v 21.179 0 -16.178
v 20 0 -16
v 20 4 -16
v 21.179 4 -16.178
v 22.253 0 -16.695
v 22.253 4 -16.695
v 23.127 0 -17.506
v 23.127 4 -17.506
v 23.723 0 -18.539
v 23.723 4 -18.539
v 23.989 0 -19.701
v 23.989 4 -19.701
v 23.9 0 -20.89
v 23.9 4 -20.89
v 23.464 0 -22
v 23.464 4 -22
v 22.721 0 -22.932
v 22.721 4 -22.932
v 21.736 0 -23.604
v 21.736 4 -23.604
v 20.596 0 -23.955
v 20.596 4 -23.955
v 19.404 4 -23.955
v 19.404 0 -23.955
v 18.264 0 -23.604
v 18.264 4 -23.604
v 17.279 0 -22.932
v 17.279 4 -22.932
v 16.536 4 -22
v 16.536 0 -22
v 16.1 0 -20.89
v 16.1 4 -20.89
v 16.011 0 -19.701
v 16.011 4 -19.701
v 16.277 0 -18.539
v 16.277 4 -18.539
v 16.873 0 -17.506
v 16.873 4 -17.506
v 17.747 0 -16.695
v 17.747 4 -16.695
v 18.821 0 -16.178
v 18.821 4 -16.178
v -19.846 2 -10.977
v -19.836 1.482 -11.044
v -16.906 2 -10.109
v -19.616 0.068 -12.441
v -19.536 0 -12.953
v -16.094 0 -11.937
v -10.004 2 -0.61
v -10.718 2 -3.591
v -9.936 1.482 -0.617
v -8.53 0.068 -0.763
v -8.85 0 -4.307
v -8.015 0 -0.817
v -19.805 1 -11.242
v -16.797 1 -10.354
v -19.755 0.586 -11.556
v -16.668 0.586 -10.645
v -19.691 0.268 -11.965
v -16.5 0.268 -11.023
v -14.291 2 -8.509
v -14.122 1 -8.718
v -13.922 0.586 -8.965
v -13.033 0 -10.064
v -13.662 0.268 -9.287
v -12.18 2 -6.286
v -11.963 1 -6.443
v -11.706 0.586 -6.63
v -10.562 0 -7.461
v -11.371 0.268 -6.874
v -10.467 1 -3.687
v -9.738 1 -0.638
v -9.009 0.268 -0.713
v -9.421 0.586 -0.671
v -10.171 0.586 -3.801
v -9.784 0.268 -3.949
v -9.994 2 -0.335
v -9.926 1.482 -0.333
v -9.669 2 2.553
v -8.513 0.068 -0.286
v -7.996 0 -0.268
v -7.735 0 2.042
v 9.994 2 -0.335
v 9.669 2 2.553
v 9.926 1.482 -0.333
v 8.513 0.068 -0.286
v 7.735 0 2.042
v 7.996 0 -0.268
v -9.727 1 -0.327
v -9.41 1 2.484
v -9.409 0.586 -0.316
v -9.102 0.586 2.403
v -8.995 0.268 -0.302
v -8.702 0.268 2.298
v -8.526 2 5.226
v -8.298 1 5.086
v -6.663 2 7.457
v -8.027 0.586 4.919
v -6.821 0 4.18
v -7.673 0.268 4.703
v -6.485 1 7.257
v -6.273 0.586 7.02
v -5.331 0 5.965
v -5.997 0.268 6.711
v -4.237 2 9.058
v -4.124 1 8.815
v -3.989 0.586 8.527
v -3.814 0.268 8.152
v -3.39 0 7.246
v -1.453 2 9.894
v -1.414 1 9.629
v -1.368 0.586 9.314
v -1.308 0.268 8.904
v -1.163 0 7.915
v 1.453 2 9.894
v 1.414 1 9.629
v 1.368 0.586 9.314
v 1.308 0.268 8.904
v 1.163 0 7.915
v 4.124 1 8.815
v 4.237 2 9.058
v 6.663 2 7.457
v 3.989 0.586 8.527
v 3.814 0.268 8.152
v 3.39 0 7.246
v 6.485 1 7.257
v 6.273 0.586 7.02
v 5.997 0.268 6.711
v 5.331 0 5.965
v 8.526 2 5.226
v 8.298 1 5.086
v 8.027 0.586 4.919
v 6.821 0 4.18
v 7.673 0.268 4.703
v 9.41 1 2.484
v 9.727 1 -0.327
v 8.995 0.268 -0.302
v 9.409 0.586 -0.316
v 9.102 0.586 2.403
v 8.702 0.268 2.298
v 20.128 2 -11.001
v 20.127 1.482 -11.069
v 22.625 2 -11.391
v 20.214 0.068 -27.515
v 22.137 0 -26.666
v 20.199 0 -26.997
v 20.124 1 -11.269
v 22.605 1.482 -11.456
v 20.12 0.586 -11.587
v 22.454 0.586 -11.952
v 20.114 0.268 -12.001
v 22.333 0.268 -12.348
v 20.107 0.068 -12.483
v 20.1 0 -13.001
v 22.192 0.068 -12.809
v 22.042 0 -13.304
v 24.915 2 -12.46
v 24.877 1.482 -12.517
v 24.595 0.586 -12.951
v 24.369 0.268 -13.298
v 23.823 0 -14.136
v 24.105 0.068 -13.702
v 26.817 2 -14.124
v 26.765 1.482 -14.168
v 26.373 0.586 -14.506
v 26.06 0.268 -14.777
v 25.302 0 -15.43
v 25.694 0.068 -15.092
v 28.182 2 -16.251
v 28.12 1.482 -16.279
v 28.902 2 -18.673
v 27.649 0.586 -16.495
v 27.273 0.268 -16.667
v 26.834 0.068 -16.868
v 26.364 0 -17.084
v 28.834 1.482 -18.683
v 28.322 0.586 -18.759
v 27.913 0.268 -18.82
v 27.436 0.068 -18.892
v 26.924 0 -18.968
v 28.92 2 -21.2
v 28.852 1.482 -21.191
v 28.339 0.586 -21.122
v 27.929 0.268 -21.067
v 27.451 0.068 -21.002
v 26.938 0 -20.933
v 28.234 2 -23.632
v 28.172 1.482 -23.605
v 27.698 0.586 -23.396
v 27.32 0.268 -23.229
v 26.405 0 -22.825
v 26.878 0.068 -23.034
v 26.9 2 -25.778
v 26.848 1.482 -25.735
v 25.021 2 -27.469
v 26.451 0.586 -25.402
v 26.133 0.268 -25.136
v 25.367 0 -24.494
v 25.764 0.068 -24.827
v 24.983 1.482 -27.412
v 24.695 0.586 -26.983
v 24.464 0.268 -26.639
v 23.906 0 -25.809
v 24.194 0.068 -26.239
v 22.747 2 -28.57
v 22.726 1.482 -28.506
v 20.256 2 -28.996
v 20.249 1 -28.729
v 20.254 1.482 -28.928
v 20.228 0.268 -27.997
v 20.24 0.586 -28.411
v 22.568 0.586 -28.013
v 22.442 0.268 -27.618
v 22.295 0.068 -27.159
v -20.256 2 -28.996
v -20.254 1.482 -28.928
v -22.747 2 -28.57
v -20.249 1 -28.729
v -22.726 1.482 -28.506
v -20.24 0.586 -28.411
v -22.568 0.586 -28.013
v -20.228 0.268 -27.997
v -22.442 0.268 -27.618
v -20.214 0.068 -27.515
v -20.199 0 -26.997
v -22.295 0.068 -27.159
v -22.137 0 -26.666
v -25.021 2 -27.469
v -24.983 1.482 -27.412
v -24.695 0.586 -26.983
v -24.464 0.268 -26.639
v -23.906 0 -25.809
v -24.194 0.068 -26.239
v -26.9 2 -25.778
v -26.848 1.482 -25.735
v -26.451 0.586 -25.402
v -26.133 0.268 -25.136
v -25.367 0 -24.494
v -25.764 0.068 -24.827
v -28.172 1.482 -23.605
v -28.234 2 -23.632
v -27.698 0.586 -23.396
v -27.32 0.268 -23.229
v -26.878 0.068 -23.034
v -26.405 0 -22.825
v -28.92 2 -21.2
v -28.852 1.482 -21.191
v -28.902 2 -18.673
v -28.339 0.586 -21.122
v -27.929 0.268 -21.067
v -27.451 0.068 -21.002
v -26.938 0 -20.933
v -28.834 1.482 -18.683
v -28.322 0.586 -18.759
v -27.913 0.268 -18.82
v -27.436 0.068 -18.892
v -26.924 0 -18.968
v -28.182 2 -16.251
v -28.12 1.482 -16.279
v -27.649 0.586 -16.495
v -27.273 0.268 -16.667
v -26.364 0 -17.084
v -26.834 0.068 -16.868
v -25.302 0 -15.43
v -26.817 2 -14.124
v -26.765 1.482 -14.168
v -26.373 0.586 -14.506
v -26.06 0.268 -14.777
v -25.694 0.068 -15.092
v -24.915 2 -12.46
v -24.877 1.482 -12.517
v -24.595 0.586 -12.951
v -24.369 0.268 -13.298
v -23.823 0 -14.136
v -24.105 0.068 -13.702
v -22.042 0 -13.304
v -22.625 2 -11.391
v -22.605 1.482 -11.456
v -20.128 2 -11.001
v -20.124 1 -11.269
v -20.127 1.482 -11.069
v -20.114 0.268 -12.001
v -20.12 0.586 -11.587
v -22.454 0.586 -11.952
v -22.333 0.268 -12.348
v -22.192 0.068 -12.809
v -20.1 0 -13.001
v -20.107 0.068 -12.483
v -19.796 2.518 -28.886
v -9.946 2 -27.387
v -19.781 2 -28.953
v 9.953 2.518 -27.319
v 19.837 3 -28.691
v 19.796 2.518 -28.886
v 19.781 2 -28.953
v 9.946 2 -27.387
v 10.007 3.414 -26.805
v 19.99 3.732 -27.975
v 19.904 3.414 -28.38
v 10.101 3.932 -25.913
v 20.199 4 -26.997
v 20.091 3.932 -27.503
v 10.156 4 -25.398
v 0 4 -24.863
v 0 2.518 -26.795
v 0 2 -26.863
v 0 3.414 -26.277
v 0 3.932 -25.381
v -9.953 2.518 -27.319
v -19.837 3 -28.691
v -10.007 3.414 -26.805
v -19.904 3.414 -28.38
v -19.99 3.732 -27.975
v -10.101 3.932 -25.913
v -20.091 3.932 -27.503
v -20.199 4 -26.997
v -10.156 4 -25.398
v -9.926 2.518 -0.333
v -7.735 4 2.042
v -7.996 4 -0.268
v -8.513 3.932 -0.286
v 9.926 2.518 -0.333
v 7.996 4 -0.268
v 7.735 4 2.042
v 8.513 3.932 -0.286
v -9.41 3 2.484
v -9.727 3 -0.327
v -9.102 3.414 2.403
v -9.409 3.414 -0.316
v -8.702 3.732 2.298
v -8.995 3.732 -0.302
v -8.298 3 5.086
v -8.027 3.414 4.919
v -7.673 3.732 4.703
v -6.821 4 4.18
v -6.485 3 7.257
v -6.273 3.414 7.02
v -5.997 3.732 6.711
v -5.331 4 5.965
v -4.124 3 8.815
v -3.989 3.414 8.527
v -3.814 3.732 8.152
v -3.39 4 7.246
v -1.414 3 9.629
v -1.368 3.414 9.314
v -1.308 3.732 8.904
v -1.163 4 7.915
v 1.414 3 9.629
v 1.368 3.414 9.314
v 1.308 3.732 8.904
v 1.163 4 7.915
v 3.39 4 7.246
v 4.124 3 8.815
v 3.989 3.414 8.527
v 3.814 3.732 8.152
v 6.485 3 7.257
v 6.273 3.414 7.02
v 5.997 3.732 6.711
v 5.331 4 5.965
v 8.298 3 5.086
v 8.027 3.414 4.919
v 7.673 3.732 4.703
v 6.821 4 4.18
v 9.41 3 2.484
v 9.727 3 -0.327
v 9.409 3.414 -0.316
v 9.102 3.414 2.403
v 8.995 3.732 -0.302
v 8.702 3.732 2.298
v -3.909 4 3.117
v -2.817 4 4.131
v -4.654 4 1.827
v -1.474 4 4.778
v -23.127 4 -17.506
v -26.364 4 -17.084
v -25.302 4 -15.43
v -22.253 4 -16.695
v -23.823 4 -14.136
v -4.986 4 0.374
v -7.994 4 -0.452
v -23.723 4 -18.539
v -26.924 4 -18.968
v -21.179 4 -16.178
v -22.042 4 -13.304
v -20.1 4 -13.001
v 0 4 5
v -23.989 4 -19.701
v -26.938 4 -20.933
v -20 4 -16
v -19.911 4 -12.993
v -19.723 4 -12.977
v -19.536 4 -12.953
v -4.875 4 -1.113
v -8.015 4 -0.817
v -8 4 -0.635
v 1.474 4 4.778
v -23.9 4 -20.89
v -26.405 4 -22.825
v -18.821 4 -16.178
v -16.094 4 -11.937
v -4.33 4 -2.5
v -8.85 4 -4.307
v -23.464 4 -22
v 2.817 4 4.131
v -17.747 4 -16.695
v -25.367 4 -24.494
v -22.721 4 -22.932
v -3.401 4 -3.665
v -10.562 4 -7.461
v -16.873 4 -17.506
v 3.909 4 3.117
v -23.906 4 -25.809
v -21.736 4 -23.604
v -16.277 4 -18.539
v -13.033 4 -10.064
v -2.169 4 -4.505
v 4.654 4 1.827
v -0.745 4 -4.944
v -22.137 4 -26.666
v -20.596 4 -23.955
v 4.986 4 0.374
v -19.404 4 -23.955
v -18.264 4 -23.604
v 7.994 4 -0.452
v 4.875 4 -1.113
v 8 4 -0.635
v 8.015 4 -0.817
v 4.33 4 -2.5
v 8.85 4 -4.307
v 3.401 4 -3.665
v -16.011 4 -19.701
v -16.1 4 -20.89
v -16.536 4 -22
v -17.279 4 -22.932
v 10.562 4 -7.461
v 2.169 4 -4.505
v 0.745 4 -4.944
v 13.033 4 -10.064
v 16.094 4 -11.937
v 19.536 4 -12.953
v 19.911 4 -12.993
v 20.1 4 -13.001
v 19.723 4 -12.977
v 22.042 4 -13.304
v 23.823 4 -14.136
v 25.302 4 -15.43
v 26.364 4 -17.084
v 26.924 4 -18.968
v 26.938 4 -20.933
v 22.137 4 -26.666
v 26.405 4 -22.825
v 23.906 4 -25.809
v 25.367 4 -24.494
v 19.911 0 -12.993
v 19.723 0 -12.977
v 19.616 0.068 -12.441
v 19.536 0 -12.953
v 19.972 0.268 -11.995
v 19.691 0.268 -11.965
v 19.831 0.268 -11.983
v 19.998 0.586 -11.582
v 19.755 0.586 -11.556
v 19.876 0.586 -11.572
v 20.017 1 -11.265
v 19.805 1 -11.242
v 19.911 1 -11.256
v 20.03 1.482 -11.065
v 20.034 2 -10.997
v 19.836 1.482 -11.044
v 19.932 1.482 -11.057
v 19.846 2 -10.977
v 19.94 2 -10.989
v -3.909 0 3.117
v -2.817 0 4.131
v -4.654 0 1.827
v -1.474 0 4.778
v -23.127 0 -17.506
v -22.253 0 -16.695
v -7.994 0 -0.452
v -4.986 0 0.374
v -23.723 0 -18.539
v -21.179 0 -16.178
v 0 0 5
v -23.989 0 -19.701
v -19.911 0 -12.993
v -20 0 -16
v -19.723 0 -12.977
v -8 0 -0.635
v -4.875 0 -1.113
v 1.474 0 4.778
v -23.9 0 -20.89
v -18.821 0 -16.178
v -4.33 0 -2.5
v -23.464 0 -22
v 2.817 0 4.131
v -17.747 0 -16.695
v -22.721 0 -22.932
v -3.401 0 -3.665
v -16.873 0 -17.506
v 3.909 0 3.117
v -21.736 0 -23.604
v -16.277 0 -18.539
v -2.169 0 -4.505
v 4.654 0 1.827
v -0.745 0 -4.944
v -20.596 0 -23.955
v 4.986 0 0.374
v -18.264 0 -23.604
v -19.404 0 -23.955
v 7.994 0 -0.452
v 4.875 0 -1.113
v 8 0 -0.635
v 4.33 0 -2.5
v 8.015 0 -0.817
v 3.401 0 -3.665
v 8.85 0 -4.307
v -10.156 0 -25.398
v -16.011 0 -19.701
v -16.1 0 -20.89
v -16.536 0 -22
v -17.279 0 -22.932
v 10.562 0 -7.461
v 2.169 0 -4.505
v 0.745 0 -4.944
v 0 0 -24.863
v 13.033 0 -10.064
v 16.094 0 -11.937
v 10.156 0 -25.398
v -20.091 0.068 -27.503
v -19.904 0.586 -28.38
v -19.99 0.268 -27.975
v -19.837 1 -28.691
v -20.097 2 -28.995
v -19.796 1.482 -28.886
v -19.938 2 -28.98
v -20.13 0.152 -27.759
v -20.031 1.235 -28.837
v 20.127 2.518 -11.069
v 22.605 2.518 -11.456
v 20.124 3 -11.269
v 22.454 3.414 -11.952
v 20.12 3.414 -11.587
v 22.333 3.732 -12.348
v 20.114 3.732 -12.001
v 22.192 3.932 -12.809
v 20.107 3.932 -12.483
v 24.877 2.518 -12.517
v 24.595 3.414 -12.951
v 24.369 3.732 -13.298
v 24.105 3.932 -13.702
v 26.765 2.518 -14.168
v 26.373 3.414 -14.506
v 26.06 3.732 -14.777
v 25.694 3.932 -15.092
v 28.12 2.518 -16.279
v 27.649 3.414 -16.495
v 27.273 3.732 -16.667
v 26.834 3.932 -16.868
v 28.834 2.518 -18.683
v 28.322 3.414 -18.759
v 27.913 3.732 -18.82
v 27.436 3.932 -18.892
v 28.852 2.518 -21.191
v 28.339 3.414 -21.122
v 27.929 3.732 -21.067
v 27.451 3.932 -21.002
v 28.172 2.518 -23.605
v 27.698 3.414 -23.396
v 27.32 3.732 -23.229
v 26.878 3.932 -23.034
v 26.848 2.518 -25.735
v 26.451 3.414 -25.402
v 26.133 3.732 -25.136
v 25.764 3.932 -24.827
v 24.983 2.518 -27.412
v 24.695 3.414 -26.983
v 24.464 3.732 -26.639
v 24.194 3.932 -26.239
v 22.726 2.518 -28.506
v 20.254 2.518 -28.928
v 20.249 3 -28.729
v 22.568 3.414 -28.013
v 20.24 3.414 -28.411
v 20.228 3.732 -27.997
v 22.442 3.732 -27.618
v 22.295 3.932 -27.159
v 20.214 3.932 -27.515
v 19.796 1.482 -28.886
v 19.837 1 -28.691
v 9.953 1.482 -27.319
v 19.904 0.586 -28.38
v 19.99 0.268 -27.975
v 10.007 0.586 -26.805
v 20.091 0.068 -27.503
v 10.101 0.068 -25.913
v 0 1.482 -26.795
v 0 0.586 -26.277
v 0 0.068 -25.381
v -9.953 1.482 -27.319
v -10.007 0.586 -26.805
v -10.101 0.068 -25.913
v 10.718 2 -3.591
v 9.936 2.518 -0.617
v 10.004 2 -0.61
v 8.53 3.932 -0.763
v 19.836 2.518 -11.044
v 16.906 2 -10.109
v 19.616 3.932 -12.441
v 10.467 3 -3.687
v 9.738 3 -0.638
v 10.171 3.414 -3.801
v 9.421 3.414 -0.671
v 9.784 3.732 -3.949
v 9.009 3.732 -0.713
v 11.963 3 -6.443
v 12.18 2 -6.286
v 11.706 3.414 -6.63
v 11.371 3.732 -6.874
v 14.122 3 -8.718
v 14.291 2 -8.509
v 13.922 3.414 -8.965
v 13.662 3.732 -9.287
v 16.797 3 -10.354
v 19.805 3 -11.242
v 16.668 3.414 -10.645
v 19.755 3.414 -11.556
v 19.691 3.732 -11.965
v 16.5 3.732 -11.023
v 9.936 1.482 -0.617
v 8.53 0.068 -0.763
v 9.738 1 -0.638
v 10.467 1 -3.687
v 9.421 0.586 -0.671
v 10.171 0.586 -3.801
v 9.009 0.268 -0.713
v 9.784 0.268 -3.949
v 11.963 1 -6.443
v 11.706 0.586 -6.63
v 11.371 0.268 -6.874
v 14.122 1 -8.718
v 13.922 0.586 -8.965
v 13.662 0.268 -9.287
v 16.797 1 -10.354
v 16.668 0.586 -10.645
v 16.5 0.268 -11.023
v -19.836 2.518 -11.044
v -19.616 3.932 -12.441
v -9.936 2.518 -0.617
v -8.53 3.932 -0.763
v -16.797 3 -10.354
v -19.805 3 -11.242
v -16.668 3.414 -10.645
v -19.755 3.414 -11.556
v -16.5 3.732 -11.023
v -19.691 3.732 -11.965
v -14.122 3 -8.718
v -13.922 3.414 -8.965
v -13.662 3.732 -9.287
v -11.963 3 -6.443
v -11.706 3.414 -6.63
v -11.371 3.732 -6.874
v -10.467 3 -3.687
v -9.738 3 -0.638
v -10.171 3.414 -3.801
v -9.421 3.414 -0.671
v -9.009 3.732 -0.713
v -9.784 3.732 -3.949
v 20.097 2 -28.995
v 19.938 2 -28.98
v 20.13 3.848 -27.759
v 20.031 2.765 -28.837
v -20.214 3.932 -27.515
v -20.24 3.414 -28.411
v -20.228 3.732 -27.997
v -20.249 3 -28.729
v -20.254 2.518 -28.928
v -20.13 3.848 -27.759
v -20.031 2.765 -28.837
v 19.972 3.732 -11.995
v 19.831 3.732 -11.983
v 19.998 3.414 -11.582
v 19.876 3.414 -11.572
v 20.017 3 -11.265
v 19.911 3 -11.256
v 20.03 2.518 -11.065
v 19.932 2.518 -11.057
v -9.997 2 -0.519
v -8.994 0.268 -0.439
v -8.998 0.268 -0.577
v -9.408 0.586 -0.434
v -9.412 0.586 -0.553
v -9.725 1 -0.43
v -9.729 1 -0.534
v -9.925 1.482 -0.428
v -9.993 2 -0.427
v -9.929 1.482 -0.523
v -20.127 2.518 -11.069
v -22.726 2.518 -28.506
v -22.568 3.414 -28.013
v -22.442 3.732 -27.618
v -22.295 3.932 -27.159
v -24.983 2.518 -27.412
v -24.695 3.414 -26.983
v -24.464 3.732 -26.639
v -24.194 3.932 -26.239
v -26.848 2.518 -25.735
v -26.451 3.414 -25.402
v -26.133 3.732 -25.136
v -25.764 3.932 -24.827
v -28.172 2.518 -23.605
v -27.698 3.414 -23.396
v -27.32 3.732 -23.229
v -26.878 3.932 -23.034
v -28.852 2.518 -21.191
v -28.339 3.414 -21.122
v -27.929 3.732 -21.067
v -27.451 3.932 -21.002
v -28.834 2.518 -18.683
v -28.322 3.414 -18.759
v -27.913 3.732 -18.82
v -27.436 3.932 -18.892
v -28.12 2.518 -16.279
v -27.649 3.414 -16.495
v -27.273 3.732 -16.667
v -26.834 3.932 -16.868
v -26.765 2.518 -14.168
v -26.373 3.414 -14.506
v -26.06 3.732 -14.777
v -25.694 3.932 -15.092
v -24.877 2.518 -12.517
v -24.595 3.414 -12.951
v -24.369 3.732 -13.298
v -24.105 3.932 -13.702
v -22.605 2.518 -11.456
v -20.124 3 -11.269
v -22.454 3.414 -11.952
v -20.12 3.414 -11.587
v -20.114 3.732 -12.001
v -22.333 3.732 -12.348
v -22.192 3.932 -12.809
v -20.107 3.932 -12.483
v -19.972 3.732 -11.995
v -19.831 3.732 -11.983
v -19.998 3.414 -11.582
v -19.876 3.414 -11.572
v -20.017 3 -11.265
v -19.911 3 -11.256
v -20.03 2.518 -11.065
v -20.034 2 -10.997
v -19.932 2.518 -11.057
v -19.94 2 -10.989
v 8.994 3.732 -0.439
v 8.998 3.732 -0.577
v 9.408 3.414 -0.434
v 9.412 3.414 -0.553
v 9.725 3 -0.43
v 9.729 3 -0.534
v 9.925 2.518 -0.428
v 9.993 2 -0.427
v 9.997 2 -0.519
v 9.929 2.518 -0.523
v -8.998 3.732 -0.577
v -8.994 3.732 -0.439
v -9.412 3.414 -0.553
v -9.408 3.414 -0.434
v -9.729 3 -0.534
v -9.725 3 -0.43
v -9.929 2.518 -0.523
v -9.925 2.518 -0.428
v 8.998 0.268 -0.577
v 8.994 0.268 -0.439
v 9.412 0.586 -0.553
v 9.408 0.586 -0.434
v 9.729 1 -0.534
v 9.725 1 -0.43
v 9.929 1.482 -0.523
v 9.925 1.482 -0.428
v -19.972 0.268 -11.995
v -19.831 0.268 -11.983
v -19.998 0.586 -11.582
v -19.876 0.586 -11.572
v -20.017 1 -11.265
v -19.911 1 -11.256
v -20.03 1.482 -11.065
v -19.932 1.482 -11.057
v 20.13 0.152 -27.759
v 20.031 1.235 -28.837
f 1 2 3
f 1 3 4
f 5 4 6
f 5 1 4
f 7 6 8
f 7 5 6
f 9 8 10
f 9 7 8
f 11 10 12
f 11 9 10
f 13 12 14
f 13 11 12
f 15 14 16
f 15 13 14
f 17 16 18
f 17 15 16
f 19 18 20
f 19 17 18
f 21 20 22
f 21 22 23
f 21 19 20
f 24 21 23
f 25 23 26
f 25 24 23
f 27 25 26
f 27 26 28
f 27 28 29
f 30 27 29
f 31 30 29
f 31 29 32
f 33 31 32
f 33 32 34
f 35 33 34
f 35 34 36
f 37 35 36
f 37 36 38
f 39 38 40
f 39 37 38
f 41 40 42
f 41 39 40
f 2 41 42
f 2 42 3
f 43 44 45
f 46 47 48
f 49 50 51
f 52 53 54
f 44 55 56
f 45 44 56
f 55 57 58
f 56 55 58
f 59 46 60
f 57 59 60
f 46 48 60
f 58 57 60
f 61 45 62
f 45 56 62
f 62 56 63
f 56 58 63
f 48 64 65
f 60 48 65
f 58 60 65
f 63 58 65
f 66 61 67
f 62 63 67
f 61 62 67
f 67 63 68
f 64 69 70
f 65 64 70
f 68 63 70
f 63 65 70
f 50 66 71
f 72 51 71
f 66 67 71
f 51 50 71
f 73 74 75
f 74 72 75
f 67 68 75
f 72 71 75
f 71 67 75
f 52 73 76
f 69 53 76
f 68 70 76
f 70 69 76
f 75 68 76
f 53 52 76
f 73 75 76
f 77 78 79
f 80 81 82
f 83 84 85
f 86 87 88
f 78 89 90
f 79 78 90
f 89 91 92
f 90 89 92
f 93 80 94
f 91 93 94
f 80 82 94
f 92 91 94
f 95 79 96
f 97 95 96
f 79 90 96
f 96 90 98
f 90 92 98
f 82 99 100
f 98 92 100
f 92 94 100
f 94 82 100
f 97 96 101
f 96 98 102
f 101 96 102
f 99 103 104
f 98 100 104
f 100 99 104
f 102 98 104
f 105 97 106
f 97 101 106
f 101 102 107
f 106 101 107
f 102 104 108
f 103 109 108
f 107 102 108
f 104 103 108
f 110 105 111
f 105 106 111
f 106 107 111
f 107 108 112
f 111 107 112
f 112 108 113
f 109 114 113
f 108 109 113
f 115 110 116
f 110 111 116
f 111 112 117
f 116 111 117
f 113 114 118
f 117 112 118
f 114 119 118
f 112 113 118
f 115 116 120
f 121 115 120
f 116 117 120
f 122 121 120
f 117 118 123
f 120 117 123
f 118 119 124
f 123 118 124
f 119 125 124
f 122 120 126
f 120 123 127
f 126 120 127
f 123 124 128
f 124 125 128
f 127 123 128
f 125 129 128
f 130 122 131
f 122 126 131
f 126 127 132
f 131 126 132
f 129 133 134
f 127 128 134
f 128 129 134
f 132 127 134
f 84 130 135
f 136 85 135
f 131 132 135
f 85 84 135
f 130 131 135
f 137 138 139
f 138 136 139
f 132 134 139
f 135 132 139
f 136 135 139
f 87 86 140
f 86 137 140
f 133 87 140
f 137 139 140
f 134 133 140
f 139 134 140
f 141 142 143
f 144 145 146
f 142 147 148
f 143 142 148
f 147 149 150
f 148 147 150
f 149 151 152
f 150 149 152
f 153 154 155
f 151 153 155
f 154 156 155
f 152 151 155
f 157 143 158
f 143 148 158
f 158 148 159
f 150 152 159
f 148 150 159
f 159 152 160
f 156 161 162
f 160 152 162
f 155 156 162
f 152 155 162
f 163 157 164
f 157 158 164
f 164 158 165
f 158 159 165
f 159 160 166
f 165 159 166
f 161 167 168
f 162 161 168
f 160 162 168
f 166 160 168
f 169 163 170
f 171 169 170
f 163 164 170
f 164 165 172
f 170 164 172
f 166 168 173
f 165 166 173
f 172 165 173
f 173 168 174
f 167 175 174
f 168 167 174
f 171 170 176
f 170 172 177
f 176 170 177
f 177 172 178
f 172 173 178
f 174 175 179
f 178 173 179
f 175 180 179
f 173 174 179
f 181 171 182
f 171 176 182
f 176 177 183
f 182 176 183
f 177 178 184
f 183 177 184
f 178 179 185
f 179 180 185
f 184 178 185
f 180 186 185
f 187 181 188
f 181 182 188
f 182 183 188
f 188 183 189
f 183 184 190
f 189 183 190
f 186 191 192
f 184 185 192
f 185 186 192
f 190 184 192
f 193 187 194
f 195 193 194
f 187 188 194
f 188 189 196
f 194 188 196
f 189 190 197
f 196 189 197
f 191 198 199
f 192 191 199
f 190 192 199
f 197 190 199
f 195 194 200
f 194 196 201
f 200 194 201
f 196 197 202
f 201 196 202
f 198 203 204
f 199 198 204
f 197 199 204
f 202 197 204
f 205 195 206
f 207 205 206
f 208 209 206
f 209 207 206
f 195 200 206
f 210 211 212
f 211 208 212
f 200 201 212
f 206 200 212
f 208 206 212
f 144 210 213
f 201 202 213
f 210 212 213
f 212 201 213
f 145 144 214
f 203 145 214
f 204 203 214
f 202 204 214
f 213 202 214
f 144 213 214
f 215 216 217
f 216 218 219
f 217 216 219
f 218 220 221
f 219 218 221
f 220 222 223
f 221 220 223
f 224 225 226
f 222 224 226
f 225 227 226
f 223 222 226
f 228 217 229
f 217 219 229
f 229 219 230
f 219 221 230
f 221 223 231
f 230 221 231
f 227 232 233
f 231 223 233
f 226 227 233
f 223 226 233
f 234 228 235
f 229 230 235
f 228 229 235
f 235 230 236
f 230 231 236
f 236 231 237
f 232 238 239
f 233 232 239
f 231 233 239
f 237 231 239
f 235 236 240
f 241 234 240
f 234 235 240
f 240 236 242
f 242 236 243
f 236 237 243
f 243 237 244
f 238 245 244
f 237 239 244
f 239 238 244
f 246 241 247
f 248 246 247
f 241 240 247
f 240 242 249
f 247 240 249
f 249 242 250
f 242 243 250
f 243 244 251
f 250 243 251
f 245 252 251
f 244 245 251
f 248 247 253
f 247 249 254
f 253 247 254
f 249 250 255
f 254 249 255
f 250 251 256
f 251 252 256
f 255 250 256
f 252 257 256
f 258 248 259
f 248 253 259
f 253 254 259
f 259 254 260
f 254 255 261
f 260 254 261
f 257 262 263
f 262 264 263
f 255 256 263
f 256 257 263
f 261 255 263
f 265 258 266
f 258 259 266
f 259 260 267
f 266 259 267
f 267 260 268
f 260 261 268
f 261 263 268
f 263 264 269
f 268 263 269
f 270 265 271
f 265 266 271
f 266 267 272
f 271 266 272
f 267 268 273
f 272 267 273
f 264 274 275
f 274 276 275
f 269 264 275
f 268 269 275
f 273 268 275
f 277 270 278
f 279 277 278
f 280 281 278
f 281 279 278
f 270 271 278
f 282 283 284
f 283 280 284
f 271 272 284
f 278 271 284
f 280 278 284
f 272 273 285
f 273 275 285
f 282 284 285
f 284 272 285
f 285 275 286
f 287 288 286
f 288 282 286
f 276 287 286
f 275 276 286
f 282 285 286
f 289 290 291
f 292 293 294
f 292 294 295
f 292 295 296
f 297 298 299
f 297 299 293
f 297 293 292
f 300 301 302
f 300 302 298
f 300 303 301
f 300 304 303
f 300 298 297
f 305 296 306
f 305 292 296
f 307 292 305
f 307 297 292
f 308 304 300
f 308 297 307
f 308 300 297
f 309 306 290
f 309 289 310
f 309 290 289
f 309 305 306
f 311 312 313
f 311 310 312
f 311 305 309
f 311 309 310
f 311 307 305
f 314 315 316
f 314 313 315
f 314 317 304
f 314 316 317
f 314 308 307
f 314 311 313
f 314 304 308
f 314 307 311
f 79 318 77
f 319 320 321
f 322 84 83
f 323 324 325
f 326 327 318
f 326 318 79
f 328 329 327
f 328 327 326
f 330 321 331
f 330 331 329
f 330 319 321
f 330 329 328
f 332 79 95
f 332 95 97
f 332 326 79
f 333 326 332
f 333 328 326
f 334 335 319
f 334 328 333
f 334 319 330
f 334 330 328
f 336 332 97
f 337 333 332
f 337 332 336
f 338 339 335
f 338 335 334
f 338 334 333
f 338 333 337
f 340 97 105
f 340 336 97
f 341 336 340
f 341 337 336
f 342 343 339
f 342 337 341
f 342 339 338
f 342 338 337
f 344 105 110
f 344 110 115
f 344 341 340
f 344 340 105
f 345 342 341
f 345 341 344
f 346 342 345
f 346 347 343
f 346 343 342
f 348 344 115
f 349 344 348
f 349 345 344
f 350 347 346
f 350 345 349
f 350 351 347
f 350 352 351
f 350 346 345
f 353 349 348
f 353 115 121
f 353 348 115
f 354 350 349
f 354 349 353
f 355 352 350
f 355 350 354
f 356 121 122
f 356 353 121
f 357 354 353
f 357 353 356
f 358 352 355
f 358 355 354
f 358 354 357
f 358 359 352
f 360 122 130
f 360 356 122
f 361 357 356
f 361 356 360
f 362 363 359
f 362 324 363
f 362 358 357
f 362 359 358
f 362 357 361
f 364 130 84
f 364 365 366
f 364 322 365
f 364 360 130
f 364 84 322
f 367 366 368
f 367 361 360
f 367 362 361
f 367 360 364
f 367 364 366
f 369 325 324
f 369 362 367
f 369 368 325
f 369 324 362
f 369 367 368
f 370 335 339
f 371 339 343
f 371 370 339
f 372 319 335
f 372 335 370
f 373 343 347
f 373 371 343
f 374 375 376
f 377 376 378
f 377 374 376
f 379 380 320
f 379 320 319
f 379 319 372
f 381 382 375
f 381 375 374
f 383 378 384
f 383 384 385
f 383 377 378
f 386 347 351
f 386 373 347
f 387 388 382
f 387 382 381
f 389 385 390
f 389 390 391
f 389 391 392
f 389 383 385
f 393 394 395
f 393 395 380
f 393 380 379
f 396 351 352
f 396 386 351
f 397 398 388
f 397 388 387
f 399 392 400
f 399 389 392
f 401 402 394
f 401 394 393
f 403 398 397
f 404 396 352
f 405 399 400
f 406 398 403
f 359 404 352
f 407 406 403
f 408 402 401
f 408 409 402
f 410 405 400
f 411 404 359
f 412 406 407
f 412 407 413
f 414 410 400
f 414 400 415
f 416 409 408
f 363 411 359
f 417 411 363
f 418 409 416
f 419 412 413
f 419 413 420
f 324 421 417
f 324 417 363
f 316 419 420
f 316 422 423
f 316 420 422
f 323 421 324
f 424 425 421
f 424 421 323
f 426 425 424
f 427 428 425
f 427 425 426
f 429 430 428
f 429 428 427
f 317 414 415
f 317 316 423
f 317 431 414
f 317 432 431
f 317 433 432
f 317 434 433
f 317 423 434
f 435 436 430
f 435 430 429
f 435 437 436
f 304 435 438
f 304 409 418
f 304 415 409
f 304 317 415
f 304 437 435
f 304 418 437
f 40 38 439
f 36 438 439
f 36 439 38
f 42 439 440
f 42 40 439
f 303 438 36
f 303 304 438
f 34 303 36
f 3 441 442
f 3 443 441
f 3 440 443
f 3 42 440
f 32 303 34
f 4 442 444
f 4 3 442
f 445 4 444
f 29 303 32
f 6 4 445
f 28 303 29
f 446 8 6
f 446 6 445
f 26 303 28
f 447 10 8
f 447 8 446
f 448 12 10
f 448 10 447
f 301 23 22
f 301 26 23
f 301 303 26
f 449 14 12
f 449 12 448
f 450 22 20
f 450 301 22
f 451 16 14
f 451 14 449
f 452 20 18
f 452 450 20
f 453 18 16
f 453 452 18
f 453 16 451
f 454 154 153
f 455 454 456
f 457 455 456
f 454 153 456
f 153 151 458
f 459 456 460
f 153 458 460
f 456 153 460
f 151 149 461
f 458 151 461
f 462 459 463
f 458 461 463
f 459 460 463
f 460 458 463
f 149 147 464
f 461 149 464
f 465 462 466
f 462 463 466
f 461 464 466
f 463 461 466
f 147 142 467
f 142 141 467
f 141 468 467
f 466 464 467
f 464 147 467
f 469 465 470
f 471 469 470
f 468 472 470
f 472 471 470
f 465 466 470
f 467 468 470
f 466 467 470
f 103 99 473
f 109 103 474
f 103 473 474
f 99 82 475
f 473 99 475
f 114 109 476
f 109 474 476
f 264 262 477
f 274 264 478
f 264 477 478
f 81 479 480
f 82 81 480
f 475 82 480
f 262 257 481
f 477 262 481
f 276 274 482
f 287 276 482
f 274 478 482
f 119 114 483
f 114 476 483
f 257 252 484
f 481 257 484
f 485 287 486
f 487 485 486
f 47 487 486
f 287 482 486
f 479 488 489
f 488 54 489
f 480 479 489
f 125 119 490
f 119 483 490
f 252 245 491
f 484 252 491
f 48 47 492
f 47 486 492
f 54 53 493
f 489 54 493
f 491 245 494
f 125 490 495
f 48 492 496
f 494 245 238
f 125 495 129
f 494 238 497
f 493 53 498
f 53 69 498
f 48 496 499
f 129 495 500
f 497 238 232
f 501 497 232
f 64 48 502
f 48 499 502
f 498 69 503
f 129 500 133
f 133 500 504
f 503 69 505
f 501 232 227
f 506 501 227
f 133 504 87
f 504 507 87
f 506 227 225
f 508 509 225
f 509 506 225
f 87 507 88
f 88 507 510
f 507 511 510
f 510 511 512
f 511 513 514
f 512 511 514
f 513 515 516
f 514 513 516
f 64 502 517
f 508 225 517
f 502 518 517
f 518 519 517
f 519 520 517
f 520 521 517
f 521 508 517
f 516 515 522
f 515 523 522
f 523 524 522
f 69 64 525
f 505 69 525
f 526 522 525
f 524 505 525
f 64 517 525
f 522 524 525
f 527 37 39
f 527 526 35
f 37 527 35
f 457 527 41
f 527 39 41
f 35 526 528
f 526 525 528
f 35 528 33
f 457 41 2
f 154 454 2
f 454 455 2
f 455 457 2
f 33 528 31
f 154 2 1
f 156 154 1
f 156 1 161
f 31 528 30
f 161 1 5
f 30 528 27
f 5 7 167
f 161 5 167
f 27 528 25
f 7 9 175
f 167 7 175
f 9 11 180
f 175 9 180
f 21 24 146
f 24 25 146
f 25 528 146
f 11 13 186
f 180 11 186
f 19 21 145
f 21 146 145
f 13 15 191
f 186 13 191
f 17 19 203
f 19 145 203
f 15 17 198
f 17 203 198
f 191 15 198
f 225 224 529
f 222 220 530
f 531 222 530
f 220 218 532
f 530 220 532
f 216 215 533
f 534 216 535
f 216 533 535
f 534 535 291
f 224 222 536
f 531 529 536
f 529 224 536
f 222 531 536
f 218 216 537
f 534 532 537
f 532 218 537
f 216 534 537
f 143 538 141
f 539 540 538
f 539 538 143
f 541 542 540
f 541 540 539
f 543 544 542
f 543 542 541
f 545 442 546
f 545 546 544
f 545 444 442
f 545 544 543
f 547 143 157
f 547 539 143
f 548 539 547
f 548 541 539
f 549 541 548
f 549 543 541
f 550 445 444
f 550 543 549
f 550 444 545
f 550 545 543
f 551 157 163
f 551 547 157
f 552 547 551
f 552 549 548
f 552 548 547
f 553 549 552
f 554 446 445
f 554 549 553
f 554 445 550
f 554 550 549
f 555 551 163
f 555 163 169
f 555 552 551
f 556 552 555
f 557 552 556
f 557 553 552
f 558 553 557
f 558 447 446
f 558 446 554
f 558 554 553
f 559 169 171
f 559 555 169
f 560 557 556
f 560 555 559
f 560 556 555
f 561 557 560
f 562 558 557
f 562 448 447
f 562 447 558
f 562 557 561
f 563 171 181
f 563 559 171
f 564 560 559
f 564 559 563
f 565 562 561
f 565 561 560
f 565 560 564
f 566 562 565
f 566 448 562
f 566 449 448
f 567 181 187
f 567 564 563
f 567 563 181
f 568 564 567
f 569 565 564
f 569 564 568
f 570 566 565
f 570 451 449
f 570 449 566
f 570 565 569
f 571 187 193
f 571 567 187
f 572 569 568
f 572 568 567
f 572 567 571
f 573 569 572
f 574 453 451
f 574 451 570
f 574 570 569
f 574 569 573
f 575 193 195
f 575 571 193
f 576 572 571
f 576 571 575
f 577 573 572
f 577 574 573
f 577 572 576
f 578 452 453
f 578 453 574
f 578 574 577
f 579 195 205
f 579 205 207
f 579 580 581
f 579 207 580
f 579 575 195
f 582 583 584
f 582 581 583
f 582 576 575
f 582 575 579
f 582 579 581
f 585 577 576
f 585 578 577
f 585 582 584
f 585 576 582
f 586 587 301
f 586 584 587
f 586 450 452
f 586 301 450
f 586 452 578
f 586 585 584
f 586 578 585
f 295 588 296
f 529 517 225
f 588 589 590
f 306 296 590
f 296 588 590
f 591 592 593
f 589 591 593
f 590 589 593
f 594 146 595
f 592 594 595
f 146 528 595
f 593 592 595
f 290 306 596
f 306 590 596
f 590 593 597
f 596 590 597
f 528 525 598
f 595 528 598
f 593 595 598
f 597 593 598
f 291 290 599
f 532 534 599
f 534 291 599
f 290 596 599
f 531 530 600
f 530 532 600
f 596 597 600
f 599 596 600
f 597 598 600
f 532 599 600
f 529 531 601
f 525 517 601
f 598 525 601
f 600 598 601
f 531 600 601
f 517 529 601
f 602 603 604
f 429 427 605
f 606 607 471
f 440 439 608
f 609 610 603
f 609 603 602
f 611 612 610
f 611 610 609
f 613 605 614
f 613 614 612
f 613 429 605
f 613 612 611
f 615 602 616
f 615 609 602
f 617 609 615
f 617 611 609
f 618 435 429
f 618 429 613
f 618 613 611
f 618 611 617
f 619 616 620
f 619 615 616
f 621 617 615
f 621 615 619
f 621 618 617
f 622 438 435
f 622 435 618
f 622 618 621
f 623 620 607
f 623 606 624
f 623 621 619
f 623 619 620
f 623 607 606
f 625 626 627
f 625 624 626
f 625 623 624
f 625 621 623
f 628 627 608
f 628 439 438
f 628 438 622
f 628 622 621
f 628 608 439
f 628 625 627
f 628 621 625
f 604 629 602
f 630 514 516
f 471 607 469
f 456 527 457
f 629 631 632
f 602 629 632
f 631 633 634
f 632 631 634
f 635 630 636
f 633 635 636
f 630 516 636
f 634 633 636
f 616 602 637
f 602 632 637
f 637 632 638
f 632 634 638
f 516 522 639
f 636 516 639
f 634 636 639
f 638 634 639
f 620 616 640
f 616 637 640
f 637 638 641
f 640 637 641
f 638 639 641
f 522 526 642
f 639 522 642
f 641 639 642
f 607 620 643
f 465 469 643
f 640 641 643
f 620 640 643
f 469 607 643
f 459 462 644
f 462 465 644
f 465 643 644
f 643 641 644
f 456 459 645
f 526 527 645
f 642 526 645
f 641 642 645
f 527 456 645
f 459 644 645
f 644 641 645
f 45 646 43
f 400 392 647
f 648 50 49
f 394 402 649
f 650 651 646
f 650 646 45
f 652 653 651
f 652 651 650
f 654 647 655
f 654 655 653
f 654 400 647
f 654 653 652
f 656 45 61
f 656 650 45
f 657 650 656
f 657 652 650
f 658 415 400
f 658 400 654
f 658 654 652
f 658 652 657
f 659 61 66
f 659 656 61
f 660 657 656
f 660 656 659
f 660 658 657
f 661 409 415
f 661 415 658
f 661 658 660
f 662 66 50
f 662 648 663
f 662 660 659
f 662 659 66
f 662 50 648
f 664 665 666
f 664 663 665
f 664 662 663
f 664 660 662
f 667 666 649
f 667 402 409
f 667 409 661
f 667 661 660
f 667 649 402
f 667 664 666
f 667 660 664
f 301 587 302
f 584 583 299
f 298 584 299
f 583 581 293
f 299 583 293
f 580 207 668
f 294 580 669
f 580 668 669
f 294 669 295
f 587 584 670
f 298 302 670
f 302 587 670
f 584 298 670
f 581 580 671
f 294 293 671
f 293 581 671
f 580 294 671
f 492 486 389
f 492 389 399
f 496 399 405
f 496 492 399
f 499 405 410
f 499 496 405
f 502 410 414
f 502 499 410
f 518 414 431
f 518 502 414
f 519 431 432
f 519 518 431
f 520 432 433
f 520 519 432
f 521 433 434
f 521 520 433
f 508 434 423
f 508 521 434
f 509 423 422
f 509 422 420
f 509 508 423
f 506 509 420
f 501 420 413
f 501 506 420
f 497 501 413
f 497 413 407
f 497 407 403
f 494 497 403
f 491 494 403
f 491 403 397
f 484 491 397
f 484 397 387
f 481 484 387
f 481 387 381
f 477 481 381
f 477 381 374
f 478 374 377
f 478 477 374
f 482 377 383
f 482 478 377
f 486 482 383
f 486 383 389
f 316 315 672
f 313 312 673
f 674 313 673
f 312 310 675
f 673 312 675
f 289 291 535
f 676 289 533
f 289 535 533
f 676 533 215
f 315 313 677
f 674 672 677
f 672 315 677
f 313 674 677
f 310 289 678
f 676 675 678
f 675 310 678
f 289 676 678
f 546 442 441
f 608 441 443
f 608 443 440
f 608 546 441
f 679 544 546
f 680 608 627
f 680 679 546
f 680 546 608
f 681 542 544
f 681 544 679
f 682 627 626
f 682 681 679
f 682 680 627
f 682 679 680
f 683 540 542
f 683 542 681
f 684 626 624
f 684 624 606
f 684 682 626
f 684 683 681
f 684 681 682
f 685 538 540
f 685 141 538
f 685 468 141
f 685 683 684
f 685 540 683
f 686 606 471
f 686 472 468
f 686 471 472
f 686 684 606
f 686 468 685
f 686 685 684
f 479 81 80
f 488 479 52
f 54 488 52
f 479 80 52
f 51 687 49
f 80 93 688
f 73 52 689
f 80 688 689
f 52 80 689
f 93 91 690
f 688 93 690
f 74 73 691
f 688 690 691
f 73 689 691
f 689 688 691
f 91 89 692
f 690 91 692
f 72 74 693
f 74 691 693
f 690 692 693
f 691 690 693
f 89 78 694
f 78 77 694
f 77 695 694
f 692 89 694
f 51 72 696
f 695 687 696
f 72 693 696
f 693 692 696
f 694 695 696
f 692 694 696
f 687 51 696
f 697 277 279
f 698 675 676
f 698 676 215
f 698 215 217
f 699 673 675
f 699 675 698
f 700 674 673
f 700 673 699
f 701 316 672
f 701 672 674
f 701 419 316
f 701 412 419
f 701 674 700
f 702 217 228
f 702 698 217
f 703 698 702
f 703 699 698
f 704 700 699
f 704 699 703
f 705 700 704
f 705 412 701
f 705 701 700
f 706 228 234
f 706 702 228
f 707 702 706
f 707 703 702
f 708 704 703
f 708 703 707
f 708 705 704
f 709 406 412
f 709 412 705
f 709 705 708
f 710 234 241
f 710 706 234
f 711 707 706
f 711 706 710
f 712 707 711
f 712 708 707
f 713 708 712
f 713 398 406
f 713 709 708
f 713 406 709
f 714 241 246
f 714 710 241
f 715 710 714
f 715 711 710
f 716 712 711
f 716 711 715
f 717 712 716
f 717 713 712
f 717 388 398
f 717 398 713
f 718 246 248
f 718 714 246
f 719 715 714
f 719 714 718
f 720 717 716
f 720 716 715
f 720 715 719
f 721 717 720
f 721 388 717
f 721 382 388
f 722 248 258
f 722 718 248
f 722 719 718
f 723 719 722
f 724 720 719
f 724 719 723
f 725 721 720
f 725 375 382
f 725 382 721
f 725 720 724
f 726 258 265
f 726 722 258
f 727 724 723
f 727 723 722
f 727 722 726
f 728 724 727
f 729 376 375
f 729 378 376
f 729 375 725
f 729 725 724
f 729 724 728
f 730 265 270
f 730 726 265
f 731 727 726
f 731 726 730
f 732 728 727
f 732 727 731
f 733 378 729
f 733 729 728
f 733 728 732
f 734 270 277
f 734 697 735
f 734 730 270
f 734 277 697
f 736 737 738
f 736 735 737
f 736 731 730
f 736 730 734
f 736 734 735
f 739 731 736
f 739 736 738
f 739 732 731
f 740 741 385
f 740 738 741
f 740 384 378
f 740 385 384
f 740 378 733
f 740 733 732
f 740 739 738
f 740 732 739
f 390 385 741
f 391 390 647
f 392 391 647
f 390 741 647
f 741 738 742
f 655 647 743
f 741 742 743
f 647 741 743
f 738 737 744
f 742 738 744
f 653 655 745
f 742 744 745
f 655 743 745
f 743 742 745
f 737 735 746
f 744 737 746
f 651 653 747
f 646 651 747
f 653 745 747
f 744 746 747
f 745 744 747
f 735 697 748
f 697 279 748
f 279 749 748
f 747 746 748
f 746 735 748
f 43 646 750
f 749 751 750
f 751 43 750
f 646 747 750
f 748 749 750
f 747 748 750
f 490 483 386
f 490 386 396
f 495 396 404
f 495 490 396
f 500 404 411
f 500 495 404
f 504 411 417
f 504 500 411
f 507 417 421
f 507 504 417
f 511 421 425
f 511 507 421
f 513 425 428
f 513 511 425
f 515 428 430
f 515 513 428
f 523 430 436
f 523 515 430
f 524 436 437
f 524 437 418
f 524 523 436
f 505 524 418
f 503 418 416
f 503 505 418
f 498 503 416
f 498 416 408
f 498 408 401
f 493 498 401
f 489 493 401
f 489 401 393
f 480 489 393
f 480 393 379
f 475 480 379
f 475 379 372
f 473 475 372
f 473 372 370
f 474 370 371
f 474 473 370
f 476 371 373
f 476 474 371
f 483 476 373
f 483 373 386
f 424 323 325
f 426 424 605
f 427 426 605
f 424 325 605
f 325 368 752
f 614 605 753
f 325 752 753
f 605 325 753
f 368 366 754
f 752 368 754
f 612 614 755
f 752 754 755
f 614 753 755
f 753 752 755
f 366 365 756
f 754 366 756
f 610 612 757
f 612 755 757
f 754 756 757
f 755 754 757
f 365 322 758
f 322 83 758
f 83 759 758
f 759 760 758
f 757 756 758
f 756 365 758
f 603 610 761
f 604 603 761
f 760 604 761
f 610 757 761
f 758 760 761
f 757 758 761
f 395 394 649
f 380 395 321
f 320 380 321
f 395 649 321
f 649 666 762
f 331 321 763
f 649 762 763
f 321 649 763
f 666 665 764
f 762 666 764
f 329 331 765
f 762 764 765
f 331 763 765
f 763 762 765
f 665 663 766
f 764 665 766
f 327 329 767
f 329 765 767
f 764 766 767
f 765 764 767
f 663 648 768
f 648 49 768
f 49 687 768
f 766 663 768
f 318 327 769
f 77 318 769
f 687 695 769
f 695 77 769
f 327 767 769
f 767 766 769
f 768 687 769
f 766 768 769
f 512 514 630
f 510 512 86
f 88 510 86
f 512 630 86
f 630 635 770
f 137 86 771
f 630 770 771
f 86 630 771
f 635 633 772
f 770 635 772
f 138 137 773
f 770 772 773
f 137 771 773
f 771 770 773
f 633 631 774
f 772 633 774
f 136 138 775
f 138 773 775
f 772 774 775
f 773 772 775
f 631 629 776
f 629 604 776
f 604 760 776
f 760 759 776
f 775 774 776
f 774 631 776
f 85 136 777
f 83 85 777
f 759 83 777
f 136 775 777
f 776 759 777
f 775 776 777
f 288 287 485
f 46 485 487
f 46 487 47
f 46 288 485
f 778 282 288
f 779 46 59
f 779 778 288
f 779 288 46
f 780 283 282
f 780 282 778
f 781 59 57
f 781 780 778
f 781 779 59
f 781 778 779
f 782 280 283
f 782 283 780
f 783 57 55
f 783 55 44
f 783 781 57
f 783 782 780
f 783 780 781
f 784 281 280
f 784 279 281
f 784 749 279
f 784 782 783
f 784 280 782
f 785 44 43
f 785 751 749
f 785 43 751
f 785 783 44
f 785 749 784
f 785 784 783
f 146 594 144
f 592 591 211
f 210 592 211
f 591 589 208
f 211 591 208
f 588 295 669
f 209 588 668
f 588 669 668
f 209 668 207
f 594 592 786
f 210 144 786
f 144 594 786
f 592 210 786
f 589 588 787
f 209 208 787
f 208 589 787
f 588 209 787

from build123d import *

# Parameters (mm, degrees)
SKETCH1_R           = 5
SKETCH1_R_2         = 4
BOSS_EXTRUDE1_DEPTH = 4
FILLET1_R           = 2


with BuildPart() as part:
    # Sketch1 → Boss-Extrude1 (new body)
    with BuildSketch(Plane(origin=(0, 0, 0), x_dir=(1, 0, 0), z_dir=(0, 1, 0))):
        with BuildLine():
            ThreePointArc((-20, 29), (-29, 20), (-20, 11))
            ThreePointArc((-20, 11), (-13.164114328, 7.468842596), (-9.989400339, 0.460305187))
            ThreePointArc((-9.989400339, 0.460305187), (0, -10), (9.989400339, 0.460305187))
            ThreePointArc((9.989400339, 0.460305187), (13.164114328, 7.468842596), (20, 11))
            ThreePointArc((20, 11), (29, 20), (20, 29))
            ThreePointArc((20, 29), (0, 26.863188813), (-20, 29))
        make_face()
        with Locations(Location((0, 0, 0), (0, 0, 270))):
            Circle(SKETCH1_R, mode=Mode.SUBTRACT)
        with Locations(Location((-20, 20, 0), (0, 0, 270))):
            Circle(SKETCH1_R_2, mode=Mode.SUBTRACT)
        with Locations(Location((20, 20, 0), (0, 0, 270))):
            Circle(SKETCH1_R_2, mode=Mode.SUBTRACT)
    extrude(amount=BOSS_EXTRUDE1_DEPTH)

    # Fillet1
    fillet1_edges = [part.edges().sort_by_distance(p)[0] for p in [
        (13.164114328, 4, -7.468842596),
        (-20, 2, -11),
        (-20, 2, -29),
        (20, 2, -29),
        (20, 2, -11),
        (9.989400339, 2, -0.460305187),
        (-9.989400339, 2, -0.460305187),
        (29, 4, -20),
        (0, 4, -26.863188813),
        (-29, 4, -20),
        (-13.164114328, 4, -7.468842596),
        (-29, 0, -20),
        (0, 0, -26.863188813),
        (29, 0, -20),
        (0, 4, 10),
        (13.164114328, 0, -7.468842596),
        (0, 0, 10),
        (-13.164114328, 0, -7.468842596),
    ]]
    fillet(fillet1_edges, radius=FILLET1_R - 0.0001)  # a hair under: the kernel refuses the full size


solid = part.part
